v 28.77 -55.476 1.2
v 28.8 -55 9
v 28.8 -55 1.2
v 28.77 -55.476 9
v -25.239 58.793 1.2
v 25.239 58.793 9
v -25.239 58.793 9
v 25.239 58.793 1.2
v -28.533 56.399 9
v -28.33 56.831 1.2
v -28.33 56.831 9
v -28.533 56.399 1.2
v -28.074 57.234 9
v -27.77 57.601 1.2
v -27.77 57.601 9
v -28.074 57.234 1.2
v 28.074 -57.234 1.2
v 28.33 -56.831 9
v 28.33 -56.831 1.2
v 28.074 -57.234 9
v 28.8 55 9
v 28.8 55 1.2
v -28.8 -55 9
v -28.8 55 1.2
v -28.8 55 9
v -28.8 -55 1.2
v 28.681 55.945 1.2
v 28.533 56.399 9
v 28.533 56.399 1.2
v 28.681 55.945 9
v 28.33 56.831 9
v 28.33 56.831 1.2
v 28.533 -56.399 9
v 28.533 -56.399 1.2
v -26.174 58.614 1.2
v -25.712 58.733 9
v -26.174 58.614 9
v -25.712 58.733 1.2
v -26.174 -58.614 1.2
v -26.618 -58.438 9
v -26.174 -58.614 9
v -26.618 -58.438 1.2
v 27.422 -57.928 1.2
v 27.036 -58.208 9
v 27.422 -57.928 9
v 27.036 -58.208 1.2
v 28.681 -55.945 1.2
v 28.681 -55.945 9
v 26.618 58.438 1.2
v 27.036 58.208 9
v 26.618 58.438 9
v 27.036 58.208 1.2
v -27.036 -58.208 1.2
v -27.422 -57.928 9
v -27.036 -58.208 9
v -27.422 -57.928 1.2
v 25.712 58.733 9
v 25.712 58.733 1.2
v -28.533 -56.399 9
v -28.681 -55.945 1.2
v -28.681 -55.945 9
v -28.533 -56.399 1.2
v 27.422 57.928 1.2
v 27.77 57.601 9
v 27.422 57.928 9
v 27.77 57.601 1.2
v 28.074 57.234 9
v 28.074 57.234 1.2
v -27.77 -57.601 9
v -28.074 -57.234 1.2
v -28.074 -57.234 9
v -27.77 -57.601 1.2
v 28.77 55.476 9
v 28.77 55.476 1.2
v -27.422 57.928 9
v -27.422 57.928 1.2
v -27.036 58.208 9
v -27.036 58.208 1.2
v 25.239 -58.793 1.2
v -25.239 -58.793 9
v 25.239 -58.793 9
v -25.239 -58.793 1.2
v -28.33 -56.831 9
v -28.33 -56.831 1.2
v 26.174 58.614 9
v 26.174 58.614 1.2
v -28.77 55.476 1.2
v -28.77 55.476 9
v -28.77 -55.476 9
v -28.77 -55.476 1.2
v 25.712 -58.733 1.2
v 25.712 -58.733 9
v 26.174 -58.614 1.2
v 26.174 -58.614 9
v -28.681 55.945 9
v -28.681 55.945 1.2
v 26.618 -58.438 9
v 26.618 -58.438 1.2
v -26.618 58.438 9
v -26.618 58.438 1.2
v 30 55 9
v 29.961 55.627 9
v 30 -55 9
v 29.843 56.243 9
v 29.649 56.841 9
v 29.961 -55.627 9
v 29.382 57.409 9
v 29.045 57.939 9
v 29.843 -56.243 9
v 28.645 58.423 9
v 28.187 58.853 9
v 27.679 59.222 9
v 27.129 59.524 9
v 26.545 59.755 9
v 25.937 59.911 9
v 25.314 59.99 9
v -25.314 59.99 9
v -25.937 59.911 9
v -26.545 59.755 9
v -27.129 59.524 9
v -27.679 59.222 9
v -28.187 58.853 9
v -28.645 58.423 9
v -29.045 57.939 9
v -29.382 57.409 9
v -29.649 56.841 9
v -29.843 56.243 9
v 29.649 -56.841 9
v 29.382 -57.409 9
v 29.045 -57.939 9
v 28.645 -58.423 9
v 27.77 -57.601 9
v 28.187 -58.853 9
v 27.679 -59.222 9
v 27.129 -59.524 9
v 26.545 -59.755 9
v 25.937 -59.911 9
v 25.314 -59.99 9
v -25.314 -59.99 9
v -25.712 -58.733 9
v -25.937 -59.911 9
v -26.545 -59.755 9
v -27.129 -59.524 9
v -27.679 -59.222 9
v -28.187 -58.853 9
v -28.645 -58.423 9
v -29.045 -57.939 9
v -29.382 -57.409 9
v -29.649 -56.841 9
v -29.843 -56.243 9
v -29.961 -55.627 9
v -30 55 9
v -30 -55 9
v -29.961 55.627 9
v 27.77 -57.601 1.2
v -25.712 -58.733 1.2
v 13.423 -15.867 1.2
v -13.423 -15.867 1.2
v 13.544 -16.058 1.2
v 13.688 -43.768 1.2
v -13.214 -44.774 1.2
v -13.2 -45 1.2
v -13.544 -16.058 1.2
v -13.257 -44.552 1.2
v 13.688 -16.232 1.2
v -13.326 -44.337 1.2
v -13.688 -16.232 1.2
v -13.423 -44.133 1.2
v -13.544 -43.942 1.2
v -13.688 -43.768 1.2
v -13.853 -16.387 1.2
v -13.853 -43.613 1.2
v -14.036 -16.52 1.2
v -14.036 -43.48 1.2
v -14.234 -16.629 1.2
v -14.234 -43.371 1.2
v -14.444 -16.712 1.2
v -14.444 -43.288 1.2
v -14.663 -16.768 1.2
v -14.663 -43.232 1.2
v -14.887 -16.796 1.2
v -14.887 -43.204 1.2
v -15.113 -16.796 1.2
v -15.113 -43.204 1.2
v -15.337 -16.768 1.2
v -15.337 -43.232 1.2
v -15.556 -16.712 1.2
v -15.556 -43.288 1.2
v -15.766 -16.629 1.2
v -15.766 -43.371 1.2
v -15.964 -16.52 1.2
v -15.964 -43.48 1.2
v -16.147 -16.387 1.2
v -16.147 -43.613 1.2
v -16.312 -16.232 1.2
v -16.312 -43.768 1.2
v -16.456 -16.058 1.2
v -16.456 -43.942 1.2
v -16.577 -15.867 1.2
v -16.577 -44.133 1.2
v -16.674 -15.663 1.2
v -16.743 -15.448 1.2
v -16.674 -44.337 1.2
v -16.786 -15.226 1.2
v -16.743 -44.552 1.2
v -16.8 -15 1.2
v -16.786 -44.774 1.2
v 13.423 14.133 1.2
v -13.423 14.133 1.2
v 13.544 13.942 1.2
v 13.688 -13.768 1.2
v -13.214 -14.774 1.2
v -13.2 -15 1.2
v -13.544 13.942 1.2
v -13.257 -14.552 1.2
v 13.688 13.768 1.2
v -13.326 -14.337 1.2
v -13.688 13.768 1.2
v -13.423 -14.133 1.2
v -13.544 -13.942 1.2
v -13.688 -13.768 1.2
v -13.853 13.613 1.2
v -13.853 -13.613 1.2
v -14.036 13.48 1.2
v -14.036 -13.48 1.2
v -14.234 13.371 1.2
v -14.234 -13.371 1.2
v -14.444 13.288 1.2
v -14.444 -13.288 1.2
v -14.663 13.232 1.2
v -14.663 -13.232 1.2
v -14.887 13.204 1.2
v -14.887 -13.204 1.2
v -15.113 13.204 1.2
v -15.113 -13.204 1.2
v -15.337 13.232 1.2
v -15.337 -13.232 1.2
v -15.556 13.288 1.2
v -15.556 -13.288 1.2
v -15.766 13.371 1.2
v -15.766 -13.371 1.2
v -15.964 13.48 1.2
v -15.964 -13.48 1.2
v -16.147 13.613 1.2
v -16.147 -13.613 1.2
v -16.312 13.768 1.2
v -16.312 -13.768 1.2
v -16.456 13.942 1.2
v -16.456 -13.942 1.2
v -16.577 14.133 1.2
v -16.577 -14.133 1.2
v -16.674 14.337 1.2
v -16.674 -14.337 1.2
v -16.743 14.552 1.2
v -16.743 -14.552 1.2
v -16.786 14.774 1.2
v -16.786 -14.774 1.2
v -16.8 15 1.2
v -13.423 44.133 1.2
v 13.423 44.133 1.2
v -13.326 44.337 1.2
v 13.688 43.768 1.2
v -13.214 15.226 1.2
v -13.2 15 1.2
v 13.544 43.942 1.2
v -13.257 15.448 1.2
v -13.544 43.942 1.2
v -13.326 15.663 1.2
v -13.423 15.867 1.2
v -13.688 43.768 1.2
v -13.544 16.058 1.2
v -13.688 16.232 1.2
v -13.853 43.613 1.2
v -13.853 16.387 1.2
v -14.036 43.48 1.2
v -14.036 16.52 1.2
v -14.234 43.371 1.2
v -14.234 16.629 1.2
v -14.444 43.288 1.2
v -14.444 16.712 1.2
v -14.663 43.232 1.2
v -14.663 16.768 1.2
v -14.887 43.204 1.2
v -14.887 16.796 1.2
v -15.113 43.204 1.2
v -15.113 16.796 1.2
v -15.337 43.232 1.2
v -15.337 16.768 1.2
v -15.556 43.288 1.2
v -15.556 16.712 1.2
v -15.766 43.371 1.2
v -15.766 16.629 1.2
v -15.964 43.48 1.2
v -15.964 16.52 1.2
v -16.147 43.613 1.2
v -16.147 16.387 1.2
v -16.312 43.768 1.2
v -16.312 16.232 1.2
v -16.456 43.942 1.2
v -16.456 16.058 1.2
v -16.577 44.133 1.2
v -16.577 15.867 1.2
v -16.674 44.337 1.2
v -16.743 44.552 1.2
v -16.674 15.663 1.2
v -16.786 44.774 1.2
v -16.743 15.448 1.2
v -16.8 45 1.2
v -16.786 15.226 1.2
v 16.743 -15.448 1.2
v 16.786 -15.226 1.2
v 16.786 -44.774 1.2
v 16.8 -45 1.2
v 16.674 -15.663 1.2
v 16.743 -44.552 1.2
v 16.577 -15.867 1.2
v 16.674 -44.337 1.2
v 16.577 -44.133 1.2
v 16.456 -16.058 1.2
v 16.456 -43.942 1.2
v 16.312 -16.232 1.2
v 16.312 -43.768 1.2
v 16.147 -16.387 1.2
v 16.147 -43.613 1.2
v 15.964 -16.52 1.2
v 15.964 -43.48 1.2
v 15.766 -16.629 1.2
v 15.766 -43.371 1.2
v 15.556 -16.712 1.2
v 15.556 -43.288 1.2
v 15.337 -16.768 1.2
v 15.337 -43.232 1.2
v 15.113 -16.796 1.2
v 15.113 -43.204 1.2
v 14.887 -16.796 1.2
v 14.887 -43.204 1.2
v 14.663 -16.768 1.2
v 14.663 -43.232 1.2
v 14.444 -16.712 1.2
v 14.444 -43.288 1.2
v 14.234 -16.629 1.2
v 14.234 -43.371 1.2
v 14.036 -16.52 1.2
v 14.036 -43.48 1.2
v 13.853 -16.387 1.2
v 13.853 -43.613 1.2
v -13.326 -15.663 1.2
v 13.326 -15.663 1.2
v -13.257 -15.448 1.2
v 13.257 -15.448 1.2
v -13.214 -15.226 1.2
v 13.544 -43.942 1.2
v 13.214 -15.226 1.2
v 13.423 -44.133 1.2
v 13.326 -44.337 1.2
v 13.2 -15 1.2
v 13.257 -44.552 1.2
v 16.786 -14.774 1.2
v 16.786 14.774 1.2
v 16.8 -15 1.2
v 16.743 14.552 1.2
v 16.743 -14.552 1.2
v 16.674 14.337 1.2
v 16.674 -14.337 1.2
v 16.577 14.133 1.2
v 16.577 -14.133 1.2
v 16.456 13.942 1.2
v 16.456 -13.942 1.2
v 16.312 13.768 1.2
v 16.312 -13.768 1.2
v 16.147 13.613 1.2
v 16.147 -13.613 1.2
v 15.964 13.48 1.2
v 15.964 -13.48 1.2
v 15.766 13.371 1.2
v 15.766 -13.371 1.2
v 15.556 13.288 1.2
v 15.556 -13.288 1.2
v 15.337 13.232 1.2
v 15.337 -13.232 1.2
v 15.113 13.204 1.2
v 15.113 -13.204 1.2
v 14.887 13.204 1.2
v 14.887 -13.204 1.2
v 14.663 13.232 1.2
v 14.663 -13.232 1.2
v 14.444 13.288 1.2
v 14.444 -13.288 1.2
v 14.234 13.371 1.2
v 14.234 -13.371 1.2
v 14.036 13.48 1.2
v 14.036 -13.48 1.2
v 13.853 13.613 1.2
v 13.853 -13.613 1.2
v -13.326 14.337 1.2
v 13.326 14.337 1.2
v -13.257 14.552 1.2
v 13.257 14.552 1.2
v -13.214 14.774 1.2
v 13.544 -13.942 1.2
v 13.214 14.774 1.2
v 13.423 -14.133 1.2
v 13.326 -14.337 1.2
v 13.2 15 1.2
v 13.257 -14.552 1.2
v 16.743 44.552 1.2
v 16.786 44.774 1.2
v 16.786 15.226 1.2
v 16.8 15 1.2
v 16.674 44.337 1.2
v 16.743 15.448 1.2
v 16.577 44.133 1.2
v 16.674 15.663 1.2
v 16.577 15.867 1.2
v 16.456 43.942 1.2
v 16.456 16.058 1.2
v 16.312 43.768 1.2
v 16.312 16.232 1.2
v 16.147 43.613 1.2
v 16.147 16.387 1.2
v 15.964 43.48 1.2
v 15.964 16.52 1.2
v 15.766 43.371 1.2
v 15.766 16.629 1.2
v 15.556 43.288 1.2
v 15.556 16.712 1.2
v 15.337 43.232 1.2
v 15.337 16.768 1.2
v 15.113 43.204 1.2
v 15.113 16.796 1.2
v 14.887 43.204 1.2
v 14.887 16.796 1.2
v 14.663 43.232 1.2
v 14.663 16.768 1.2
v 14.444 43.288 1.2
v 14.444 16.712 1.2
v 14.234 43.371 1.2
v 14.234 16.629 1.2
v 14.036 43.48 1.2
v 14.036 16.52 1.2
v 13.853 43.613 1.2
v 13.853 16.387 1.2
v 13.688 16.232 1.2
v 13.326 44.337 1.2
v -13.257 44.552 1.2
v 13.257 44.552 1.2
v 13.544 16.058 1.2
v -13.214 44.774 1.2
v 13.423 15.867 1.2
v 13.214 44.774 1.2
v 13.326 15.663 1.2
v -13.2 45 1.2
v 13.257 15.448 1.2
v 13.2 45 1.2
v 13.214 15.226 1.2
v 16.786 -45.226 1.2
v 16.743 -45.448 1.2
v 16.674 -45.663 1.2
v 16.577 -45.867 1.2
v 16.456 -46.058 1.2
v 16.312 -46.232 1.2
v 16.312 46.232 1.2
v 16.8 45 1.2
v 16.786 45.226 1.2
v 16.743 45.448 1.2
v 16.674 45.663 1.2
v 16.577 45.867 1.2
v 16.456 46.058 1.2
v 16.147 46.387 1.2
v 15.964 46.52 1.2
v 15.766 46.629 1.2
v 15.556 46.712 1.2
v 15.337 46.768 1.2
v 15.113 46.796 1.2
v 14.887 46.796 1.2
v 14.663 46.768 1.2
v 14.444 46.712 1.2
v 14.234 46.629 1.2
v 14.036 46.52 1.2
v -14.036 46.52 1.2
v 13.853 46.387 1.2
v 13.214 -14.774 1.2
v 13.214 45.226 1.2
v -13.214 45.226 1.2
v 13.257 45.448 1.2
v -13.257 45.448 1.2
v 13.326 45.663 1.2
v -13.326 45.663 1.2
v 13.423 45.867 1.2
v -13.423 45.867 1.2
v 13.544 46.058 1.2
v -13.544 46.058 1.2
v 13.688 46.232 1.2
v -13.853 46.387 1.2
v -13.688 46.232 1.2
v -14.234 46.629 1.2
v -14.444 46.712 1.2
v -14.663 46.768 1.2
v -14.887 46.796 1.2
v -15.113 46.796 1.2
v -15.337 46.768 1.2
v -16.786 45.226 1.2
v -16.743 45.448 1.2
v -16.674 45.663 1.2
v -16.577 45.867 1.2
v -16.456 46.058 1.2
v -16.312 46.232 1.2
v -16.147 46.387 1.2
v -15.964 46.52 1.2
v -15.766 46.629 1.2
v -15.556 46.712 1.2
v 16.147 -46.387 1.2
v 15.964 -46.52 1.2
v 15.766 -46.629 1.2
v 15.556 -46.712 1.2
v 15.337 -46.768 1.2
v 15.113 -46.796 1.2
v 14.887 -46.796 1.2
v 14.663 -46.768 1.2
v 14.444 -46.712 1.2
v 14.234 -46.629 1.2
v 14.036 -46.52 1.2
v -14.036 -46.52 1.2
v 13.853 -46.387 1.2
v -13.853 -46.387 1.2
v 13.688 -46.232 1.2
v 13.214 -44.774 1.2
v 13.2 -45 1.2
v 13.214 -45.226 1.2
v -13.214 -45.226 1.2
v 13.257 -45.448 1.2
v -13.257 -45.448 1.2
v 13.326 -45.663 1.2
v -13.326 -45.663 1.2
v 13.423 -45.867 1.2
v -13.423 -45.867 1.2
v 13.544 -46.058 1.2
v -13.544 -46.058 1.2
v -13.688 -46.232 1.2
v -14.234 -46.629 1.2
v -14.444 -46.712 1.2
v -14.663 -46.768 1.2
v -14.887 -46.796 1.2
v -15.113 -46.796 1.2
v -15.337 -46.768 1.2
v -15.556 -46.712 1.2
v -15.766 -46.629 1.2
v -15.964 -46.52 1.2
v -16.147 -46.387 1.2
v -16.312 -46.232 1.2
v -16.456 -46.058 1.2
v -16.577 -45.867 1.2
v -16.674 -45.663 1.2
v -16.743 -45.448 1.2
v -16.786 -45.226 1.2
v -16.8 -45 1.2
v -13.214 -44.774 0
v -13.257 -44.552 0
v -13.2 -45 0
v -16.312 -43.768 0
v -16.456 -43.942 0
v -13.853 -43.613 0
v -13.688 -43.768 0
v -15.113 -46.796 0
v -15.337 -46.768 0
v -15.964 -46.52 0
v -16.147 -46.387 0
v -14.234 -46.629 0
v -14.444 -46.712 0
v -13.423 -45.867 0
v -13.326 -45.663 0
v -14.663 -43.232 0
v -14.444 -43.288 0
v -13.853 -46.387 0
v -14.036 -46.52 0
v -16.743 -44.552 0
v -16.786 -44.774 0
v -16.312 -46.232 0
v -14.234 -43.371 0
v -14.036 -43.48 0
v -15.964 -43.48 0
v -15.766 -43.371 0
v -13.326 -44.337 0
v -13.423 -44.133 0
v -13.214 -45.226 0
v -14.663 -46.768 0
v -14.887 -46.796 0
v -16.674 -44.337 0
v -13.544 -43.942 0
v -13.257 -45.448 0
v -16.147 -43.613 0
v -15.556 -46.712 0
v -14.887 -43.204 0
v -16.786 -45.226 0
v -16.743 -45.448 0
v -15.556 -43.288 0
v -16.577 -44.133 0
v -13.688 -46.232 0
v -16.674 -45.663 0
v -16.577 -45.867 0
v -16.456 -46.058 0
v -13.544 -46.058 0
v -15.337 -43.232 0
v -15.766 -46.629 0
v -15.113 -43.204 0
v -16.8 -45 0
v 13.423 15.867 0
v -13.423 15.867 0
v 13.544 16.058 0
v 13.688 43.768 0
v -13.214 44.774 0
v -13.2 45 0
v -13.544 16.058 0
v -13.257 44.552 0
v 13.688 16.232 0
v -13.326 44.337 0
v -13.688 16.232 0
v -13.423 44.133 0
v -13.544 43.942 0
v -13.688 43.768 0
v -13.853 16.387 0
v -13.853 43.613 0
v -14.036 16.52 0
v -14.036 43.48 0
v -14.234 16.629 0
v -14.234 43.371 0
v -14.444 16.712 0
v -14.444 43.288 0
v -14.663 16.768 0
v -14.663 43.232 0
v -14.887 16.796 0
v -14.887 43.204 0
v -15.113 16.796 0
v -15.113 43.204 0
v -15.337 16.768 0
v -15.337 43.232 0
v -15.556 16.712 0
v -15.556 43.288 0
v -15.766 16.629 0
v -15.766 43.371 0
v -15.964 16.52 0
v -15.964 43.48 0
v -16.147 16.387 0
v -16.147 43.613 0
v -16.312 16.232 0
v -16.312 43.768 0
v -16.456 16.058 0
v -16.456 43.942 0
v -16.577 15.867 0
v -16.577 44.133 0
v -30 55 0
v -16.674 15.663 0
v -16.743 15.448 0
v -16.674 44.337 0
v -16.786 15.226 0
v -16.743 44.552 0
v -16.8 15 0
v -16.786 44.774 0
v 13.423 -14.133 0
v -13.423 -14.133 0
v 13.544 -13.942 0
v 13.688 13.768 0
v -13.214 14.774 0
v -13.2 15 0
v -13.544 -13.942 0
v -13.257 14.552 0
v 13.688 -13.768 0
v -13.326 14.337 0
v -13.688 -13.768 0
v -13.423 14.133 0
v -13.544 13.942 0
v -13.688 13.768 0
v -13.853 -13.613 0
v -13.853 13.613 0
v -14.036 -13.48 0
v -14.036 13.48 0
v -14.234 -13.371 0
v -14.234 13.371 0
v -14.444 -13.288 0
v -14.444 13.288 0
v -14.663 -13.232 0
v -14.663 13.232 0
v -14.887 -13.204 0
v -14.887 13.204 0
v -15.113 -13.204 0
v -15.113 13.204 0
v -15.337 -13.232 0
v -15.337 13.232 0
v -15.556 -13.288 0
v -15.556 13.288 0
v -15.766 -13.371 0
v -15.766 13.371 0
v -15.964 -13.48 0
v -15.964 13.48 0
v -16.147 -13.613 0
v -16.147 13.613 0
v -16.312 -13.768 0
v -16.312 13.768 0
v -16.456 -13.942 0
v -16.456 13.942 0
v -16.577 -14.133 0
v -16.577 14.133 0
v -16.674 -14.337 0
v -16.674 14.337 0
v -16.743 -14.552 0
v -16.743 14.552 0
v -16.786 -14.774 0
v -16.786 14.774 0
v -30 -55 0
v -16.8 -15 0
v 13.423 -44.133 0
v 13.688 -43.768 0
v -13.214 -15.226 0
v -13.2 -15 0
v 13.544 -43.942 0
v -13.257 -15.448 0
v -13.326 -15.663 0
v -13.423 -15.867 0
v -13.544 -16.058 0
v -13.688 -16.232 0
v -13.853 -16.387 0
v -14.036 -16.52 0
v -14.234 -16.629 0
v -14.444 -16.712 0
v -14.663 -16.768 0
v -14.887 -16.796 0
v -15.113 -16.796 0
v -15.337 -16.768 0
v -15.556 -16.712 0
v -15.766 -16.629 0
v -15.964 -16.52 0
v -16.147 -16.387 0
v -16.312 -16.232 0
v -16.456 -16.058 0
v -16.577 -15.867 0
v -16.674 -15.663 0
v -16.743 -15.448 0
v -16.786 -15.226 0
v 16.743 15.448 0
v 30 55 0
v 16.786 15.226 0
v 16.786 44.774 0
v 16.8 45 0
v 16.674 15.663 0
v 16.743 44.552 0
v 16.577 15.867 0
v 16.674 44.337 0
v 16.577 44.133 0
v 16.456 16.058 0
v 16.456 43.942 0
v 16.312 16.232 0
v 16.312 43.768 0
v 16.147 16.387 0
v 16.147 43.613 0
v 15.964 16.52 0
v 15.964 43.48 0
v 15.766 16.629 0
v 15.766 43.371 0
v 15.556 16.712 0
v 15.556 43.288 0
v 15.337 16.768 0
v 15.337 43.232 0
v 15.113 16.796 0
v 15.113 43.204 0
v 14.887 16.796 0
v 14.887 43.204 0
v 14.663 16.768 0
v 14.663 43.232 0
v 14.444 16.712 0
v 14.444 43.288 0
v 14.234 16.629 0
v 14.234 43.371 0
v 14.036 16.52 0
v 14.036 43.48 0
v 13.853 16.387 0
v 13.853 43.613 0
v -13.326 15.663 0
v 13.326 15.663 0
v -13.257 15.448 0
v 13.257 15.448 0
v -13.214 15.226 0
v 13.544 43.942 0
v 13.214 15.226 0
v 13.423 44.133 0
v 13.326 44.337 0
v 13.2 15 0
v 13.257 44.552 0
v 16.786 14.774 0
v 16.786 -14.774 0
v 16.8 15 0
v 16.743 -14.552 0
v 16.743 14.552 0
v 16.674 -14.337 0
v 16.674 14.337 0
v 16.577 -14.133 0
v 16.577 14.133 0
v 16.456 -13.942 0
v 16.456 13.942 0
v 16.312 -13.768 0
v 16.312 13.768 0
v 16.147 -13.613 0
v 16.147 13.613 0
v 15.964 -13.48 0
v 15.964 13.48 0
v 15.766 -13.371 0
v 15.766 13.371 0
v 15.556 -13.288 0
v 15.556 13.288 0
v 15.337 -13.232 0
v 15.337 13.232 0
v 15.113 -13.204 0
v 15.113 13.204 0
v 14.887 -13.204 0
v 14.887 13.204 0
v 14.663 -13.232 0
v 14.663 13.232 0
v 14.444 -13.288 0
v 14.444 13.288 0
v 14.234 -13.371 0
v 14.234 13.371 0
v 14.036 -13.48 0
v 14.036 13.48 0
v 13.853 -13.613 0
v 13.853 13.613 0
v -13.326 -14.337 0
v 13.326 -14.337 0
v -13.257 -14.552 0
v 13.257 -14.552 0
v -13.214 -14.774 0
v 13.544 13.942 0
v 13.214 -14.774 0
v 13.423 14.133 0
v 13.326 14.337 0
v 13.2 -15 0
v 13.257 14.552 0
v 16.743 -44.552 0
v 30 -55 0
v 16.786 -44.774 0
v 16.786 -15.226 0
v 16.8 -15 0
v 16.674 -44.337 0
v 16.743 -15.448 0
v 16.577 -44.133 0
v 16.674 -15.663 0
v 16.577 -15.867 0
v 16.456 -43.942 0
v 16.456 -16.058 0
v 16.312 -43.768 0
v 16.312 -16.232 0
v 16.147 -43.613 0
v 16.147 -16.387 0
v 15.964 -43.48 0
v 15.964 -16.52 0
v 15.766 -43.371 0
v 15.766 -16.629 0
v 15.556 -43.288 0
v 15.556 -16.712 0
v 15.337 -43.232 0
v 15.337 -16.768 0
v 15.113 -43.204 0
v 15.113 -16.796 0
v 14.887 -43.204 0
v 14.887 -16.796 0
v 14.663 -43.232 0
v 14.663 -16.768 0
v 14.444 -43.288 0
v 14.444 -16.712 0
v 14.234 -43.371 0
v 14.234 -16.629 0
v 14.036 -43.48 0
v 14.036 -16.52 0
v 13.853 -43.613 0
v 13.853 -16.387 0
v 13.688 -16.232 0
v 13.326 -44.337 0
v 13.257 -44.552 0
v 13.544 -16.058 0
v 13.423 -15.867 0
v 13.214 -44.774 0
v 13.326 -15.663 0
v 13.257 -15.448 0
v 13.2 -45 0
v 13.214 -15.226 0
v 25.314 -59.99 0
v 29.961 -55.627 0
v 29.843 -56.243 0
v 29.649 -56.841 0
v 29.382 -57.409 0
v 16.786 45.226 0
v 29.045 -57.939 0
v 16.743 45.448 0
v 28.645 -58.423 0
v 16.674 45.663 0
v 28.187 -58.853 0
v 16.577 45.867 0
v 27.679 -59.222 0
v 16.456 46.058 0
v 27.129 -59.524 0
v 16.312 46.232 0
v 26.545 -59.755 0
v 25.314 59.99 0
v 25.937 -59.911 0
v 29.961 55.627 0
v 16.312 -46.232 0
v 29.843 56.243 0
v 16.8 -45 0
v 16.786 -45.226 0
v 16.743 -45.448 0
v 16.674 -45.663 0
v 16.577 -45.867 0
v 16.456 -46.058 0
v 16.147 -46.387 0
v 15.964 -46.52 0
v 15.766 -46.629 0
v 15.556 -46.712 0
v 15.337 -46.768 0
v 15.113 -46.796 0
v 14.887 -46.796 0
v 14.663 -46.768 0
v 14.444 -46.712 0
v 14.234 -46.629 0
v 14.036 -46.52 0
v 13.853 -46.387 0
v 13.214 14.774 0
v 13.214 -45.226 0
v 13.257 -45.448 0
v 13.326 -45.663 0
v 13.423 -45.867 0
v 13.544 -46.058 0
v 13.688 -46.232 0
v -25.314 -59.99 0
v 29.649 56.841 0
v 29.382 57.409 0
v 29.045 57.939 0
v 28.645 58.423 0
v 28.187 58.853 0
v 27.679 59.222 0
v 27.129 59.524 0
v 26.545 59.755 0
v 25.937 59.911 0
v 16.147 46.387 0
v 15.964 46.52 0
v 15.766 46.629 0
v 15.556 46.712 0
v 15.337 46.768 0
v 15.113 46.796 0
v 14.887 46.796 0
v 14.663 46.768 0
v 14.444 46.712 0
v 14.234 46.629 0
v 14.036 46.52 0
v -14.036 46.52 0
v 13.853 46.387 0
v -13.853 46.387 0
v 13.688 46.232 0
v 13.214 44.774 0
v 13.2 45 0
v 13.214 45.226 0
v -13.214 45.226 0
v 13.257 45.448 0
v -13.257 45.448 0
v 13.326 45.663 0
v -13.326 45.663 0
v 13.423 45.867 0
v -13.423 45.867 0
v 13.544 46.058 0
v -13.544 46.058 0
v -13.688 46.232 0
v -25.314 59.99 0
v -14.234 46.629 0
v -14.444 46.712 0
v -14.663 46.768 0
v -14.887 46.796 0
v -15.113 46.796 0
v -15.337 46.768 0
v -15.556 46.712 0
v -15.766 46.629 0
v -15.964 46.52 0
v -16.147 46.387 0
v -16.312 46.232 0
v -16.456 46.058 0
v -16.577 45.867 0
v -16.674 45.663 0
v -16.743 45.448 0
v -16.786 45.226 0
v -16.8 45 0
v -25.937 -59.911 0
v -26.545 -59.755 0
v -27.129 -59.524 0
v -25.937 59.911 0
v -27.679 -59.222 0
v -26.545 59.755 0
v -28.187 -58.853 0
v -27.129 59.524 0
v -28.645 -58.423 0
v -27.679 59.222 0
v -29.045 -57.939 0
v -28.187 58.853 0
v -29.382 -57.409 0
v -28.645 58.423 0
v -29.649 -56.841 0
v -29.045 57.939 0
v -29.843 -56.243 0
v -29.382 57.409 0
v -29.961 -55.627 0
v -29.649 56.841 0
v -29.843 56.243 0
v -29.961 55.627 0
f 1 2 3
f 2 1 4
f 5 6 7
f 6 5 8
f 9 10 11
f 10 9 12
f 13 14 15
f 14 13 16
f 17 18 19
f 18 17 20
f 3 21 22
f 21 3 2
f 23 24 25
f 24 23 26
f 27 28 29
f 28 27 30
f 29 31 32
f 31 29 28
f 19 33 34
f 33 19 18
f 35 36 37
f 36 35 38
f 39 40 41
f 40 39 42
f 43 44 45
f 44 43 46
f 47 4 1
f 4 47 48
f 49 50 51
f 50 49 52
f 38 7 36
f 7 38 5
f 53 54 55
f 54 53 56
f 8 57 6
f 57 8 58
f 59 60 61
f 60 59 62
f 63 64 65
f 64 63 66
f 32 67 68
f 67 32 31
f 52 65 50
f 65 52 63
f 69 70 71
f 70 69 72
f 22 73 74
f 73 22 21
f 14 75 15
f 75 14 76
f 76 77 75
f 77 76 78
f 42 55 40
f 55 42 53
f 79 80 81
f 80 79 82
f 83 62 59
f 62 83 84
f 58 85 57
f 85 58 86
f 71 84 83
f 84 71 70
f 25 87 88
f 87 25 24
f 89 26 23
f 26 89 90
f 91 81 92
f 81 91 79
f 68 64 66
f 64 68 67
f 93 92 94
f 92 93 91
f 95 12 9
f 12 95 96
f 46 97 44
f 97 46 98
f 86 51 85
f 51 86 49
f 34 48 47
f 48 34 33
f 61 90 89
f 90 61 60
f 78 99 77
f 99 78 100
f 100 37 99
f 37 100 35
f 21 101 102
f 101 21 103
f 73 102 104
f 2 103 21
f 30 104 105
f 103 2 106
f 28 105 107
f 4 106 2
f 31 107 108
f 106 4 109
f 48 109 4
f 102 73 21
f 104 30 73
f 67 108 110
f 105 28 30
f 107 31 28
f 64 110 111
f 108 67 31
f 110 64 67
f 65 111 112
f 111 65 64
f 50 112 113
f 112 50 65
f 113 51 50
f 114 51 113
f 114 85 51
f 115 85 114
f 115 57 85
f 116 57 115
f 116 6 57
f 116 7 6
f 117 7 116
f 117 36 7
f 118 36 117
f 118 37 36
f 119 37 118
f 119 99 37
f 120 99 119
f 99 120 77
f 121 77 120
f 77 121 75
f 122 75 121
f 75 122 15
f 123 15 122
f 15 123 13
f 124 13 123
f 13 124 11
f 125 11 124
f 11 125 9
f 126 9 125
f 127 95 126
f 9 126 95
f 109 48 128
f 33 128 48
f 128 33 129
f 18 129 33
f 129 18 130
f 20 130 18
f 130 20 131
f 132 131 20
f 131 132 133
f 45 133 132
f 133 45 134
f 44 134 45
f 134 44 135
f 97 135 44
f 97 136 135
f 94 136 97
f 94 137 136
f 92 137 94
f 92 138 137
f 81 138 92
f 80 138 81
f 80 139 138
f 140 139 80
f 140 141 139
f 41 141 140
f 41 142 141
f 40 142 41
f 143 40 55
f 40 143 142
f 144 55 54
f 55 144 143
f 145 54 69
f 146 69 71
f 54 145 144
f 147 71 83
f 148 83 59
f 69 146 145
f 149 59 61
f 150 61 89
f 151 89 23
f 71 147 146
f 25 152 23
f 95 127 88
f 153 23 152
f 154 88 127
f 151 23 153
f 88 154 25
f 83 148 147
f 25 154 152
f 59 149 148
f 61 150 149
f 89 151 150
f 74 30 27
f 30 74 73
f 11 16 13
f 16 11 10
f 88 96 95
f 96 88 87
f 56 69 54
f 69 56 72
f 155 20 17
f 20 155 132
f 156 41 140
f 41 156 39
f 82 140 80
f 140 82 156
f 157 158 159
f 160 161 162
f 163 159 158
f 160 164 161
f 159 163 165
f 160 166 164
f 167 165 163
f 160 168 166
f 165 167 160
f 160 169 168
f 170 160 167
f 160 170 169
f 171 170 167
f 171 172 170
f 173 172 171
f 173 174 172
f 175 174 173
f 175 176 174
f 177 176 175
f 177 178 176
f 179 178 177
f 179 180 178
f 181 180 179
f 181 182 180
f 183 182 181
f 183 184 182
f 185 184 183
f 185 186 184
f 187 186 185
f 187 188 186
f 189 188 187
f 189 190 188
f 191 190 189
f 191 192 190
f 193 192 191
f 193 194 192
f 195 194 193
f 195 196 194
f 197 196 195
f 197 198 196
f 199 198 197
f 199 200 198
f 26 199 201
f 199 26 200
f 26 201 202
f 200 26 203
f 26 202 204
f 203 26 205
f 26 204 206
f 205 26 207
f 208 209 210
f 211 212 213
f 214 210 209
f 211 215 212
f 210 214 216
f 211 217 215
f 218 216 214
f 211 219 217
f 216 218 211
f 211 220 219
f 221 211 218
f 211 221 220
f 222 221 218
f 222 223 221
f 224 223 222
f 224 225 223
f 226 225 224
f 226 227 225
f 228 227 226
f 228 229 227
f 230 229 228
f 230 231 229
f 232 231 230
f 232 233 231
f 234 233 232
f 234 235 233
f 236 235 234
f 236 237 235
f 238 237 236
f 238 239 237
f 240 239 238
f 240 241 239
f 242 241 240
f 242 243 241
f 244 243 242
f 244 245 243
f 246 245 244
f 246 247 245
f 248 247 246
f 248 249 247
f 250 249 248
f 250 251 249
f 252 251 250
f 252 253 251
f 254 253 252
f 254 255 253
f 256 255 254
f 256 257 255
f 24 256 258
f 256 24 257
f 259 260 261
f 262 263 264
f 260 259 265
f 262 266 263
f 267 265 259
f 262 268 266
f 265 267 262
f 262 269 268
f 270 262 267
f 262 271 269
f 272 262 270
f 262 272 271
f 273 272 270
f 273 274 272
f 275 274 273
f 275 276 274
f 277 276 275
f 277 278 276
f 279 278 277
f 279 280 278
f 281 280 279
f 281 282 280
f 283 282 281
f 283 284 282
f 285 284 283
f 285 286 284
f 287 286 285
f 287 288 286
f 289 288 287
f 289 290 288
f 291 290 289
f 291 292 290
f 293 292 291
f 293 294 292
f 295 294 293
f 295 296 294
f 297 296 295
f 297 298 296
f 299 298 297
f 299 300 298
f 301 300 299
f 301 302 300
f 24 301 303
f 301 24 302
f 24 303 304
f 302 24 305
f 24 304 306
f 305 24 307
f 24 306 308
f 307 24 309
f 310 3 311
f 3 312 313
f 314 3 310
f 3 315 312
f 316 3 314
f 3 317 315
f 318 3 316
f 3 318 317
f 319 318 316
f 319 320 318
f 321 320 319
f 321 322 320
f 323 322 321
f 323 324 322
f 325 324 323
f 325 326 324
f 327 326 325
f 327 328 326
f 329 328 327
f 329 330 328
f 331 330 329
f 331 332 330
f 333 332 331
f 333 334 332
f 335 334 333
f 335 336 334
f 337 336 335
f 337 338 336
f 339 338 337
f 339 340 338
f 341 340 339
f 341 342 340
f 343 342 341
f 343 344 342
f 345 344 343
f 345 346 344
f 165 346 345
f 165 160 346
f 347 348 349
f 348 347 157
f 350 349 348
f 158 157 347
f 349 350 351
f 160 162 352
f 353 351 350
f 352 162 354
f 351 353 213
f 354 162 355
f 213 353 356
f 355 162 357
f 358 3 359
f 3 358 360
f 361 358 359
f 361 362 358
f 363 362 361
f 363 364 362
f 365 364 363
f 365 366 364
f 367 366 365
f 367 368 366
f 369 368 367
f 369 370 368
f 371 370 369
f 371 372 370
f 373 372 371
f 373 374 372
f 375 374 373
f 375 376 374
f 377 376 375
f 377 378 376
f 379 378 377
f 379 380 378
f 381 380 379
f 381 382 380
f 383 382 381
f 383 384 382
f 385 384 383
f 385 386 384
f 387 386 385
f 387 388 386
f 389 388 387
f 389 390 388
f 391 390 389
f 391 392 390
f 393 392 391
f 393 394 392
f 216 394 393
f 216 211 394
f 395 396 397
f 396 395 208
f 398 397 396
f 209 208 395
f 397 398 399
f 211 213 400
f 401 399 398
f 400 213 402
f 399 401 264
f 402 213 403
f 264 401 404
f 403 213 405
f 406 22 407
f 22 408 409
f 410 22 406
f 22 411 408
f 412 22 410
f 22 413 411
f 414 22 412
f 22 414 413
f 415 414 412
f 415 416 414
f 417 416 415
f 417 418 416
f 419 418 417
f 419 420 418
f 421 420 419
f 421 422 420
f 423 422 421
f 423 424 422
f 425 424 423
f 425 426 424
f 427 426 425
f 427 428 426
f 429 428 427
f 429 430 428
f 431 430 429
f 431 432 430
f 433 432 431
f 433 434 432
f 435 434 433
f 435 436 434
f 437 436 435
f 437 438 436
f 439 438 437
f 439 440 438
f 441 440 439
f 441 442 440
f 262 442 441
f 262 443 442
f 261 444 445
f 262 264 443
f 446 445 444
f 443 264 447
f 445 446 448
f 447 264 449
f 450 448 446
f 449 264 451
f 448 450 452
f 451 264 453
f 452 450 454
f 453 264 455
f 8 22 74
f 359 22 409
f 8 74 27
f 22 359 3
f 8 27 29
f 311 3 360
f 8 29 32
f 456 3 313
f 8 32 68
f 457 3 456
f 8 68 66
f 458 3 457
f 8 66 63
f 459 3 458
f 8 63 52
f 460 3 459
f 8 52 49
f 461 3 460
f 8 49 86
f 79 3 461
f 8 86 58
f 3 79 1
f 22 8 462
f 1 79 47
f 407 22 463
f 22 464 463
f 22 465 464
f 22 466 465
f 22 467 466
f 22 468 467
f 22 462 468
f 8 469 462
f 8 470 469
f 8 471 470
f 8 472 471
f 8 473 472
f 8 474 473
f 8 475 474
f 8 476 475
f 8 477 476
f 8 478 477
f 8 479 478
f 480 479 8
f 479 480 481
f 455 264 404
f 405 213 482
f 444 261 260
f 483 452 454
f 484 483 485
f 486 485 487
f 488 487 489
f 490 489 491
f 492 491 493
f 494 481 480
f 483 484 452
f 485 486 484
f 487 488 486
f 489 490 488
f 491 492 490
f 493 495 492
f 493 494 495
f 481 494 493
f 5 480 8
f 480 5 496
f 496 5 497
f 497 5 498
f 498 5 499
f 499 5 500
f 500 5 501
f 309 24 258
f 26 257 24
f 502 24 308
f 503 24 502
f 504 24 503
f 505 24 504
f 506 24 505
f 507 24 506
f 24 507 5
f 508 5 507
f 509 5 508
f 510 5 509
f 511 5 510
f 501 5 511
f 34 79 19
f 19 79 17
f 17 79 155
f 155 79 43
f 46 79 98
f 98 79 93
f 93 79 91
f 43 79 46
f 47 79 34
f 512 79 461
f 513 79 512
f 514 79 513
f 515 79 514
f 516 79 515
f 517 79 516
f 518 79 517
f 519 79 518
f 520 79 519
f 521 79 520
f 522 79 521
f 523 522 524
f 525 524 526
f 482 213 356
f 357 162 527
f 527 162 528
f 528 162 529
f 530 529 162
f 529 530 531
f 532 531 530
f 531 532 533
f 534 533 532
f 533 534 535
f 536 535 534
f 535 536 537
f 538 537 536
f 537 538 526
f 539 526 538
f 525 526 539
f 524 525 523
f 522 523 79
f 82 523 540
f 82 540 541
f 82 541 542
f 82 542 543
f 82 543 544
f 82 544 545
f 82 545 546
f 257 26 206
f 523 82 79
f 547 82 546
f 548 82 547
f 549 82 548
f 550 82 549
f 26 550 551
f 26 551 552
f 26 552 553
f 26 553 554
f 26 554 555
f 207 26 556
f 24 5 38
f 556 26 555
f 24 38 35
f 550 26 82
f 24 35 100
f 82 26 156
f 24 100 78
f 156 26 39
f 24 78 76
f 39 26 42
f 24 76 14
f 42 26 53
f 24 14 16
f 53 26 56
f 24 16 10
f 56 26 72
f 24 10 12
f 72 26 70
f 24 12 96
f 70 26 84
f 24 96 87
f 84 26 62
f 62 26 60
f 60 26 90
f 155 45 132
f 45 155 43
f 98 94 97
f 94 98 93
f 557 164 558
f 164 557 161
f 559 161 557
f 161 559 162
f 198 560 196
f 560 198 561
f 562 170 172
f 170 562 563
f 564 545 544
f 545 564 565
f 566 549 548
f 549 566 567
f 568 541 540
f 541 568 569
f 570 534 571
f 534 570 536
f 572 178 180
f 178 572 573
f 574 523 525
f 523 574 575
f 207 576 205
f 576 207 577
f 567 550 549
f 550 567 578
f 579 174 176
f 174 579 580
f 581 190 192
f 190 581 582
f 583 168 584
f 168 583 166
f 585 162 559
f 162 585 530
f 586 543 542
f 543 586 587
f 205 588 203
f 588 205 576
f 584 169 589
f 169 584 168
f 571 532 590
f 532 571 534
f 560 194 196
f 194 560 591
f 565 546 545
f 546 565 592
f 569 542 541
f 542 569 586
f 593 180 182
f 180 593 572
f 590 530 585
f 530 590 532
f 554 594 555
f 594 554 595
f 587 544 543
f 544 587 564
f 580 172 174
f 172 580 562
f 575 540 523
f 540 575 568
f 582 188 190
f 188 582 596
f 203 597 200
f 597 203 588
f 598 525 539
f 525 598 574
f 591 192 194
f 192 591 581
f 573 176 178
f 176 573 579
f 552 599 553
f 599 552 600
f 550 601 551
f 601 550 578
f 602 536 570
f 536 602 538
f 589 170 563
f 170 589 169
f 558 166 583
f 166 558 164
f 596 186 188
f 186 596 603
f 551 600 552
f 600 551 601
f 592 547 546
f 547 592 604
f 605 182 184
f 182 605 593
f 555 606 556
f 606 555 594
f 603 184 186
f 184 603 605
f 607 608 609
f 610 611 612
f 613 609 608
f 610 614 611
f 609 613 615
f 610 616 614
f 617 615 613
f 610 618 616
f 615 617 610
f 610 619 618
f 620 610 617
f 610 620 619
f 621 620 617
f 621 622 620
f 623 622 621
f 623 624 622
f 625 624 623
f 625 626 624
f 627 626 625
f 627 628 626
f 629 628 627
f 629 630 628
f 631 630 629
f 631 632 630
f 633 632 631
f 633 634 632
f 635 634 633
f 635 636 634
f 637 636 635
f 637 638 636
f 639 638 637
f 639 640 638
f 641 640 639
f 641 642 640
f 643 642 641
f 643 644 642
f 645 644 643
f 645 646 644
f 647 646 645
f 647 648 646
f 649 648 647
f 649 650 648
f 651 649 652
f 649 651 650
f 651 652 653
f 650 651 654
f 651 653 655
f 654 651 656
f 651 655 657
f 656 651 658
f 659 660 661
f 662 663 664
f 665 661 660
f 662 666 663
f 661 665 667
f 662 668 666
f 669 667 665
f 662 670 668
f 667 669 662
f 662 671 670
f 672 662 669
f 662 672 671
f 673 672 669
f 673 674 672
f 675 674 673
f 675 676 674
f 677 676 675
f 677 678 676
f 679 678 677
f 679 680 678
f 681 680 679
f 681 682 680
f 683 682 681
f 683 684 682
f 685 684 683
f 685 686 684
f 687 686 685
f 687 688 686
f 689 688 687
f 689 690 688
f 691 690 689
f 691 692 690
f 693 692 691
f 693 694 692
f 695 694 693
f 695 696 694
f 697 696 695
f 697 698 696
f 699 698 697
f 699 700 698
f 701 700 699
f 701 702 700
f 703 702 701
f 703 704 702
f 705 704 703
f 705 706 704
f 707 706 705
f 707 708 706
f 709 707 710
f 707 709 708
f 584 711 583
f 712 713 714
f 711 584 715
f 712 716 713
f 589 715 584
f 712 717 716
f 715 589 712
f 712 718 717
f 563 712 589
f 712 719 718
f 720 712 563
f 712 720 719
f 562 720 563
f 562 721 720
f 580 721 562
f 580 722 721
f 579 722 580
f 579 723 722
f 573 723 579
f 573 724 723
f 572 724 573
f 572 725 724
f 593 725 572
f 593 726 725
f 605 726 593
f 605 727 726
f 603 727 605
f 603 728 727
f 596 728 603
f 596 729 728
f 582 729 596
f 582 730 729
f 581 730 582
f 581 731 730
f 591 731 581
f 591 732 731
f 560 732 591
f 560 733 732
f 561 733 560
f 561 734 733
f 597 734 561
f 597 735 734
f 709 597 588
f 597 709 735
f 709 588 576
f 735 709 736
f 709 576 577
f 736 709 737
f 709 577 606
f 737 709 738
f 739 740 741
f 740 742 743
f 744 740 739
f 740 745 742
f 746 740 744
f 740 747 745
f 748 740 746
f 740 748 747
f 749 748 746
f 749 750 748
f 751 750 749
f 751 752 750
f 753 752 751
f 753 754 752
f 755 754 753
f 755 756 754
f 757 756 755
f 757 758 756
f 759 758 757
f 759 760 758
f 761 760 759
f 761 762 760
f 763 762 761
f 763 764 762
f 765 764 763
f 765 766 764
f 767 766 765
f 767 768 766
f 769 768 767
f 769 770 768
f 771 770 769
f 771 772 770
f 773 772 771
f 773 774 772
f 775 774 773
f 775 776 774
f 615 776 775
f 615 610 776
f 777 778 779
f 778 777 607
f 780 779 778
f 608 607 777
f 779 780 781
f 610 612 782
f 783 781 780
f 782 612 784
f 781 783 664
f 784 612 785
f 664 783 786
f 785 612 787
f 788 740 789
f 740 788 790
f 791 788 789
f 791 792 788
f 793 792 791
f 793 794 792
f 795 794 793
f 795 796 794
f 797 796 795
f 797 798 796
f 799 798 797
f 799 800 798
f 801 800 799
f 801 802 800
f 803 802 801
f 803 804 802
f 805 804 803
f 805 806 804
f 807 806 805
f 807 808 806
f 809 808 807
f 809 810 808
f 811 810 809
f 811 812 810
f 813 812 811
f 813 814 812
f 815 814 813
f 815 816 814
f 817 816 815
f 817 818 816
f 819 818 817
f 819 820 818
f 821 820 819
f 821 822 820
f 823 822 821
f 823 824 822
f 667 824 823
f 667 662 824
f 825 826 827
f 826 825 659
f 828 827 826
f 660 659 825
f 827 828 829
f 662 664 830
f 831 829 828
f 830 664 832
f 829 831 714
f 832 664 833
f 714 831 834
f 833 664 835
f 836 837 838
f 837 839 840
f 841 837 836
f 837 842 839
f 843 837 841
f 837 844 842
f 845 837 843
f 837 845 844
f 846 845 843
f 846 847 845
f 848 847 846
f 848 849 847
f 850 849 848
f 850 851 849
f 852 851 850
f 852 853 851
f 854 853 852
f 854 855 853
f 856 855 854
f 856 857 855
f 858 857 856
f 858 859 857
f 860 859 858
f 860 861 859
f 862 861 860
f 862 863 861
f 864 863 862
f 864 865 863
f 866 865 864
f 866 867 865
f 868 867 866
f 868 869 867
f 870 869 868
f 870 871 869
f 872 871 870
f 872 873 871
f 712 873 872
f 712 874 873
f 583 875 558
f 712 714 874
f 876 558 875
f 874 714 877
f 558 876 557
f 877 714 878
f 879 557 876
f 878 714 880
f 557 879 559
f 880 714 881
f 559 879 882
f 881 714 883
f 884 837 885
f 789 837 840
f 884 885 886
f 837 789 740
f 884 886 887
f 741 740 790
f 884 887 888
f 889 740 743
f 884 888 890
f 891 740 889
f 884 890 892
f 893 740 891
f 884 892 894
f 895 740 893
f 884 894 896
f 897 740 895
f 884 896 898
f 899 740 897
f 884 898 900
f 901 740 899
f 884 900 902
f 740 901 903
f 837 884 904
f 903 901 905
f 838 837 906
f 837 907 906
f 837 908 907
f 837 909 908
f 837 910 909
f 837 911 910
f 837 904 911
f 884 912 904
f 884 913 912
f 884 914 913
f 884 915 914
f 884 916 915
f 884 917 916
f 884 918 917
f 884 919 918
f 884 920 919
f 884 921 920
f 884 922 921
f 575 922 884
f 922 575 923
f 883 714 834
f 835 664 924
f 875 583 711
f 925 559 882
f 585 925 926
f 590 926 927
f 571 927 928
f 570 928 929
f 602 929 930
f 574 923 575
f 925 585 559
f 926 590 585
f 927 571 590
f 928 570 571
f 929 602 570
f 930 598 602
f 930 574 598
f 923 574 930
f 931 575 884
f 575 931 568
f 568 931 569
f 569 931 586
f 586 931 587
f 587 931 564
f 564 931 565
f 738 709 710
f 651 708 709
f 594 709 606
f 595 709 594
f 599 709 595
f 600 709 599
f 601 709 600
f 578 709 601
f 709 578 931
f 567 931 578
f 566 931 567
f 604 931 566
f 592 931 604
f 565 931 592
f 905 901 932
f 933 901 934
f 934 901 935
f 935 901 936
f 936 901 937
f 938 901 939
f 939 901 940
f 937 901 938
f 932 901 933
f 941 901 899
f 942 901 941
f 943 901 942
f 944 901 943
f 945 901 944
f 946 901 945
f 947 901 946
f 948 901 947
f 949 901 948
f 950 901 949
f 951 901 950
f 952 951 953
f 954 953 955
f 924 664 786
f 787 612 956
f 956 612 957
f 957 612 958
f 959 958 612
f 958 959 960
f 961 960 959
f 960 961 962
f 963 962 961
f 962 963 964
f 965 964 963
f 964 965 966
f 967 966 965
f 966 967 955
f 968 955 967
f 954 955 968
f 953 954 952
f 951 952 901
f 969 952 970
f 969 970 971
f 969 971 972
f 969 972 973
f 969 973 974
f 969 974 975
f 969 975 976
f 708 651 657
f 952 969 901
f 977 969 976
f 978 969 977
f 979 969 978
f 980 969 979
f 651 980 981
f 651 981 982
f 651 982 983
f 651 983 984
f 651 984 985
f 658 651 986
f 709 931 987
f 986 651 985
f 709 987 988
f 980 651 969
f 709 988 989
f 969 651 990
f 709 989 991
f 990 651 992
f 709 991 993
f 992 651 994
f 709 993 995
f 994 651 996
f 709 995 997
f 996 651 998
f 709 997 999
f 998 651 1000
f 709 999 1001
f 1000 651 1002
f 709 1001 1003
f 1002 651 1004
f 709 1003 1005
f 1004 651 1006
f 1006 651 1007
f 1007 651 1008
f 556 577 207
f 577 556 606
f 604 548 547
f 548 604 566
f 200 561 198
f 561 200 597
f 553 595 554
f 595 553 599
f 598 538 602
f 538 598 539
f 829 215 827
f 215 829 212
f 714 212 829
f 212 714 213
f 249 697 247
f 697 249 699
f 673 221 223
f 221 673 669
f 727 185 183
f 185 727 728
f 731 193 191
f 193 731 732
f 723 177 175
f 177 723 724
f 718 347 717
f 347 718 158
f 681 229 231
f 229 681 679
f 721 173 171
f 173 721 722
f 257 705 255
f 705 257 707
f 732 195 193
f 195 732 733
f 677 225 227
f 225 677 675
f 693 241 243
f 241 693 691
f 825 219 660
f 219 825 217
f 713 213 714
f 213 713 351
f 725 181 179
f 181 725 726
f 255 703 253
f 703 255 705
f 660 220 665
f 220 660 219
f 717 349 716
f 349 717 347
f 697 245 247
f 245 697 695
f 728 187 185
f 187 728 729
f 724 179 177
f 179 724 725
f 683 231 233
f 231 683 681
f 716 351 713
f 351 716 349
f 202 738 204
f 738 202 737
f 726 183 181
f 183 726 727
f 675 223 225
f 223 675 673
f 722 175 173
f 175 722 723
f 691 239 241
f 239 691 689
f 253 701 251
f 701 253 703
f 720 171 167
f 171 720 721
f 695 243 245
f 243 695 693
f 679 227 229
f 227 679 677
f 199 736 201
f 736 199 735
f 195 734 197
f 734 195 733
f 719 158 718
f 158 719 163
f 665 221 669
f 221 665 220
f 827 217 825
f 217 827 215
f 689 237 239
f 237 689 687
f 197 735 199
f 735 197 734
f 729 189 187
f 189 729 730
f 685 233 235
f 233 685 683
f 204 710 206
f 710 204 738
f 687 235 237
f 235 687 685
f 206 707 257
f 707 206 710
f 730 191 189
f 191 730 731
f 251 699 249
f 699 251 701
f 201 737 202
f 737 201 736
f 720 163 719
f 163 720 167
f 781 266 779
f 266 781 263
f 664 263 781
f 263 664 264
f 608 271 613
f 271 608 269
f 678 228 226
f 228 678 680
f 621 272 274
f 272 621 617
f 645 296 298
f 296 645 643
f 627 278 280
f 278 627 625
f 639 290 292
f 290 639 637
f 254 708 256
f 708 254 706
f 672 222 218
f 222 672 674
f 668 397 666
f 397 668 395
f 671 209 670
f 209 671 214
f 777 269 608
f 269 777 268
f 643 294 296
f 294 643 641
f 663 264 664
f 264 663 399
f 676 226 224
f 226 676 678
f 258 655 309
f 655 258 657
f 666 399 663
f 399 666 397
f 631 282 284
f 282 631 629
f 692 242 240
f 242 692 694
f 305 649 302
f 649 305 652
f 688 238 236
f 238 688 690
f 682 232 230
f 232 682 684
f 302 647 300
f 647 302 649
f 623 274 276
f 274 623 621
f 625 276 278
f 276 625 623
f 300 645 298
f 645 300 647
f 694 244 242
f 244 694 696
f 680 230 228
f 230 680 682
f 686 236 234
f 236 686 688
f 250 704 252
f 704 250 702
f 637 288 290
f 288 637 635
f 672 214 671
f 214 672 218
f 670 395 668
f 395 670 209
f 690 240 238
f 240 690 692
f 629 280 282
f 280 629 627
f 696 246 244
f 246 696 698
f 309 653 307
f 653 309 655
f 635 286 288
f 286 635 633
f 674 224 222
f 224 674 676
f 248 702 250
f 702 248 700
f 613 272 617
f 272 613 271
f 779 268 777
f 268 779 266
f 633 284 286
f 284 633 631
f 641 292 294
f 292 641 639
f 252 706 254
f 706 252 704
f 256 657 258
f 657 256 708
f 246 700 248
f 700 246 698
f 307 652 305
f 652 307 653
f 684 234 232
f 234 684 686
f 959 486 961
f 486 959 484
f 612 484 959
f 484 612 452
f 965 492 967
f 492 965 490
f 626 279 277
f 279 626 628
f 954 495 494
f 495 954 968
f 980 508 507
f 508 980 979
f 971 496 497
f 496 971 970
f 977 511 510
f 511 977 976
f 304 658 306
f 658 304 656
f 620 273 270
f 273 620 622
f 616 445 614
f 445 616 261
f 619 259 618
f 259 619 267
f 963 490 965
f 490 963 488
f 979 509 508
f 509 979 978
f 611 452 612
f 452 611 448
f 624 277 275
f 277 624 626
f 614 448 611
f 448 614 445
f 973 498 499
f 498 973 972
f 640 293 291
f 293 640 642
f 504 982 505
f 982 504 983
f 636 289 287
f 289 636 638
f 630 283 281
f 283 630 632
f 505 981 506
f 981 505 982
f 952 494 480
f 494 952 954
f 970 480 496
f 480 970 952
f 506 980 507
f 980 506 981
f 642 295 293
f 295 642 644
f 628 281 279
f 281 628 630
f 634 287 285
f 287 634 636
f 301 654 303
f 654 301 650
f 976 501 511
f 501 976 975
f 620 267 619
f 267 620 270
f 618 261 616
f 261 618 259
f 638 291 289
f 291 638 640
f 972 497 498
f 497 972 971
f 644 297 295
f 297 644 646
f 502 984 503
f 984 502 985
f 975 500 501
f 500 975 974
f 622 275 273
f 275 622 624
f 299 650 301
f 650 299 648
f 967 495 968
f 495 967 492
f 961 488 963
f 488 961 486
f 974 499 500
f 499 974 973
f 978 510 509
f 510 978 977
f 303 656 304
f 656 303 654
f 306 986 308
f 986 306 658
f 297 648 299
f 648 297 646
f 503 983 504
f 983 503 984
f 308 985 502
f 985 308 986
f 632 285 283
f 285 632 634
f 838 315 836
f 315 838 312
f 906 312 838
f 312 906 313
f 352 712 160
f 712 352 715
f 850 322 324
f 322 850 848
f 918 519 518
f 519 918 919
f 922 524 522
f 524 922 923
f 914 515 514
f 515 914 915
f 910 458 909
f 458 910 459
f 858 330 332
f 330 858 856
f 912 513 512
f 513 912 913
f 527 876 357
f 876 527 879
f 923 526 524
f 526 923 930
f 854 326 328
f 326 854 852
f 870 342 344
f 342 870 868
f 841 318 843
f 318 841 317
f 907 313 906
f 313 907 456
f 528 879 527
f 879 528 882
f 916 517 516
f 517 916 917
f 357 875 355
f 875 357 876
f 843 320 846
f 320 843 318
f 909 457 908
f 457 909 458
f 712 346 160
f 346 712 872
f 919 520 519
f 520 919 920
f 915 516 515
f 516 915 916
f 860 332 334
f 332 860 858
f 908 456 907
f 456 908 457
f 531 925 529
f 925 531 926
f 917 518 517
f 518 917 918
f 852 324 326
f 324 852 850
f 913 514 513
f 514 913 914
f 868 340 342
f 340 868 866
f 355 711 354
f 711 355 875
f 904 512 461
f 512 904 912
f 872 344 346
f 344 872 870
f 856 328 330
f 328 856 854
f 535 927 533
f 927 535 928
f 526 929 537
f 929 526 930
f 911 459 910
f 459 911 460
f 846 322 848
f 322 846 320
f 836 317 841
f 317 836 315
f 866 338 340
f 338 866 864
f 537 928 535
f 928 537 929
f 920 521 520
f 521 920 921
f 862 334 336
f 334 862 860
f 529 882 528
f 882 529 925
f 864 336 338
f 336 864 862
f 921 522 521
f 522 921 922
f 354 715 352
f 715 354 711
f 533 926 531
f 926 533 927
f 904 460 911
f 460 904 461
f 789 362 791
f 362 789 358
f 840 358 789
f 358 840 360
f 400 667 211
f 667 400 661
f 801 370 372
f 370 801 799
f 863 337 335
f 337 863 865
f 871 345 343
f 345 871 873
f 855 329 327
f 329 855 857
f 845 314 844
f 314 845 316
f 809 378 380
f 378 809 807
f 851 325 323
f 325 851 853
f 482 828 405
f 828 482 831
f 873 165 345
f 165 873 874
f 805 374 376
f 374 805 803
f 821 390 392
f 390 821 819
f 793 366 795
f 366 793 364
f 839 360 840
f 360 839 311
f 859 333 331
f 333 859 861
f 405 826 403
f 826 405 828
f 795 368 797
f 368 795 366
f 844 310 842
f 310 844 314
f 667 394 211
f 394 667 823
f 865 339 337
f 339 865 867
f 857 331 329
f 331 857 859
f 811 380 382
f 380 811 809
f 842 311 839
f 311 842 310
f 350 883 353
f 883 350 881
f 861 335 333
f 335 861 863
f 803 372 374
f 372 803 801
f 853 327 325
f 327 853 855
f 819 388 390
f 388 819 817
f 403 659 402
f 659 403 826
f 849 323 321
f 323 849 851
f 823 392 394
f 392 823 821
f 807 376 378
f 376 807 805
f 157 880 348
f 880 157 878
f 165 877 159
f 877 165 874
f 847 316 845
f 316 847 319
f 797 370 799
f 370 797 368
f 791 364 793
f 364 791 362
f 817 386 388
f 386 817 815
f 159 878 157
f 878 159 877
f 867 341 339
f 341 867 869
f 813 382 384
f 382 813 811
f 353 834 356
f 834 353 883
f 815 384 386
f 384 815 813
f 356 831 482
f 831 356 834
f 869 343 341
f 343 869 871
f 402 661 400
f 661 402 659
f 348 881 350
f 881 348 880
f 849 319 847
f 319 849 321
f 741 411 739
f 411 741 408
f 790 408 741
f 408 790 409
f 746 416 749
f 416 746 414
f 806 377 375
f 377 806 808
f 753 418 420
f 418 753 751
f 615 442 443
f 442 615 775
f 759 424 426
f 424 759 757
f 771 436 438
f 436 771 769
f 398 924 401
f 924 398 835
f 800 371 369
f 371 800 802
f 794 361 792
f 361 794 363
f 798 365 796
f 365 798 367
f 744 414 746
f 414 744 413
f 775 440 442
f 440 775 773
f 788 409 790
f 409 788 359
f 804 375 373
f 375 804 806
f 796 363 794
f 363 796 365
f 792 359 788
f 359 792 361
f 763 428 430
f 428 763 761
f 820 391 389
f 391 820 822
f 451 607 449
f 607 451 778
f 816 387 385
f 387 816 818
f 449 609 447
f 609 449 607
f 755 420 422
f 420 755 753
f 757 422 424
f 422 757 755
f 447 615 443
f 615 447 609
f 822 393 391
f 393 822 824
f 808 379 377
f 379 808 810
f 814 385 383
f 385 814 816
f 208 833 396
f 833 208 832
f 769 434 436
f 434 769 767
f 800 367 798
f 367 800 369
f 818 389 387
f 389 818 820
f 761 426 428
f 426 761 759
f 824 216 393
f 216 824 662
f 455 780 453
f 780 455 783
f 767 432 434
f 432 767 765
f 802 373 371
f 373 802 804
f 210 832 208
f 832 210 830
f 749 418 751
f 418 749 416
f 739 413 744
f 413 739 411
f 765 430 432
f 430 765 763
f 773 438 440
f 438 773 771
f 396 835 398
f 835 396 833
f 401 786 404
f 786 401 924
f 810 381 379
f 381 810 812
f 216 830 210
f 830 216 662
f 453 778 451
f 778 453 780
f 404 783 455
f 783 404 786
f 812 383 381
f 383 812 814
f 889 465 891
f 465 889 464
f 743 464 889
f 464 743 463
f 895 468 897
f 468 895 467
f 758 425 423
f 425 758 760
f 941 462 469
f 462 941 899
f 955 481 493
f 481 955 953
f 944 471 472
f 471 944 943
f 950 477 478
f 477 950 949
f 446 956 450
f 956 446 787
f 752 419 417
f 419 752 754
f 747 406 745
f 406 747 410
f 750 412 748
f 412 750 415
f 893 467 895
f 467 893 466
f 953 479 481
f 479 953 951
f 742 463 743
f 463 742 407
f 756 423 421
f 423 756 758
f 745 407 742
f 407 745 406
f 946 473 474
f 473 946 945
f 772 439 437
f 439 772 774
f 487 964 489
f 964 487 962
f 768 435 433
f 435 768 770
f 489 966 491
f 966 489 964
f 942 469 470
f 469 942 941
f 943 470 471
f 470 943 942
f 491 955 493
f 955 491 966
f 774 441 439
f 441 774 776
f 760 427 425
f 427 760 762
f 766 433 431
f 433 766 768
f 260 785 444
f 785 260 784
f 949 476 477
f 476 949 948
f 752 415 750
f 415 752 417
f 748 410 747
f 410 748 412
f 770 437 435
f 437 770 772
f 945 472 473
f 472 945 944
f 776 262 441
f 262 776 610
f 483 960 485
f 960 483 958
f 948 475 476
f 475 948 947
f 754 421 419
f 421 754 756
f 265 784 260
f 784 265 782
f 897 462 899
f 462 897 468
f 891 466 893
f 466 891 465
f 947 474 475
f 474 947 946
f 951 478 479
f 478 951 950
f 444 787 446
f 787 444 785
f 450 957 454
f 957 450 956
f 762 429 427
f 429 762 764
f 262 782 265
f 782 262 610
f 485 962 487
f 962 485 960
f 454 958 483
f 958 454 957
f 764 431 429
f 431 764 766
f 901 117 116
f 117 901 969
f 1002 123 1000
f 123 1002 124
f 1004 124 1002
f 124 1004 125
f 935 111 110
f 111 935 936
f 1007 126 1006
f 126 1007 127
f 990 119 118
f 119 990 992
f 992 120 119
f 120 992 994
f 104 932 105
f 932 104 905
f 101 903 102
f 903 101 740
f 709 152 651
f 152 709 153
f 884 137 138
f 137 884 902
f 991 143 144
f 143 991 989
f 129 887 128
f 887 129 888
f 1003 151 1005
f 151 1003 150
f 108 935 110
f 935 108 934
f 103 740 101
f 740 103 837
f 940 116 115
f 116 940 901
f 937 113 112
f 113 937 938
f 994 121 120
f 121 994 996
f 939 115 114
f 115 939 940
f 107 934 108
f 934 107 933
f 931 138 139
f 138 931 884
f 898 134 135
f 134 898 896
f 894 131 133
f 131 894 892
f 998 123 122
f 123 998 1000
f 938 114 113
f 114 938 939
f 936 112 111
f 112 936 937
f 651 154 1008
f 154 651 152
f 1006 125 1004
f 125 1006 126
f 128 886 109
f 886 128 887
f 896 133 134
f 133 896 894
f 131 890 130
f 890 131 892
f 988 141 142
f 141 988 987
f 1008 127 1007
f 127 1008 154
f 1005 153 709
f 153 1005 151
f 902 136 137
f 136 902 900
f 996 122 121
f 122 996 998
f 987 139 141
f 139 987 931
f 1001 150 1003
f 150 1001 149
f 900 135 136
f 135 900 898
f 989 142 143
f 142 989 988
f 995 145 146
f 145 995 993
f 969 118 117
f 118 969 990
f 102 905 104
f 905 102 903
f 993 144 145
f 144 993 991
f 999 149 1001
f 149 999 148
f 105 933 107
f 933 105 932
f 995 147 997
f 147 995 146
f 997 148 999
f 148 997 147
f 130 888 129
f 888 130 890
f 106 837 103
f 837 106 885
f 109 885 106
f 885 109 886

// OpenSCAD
$fn = 50;


difference() {
	union() {
		hull() {
			translate(v = [-25.0000000000, 55.0000000000, 0]) {
				cylinder(h = 9, r = 5);
			}
			translate(v = [25.0000000000, 55.0000000000, 0]) {
				cylinder(h = 9, r = 5);
			}
			translate(v = [-25.0000000000, -55.0000000000, 0]) {
				cylinder(h = 9, r = 5);
			}
			translate(v = [25.0000000000, -55.0000000000, 0]) {
				cylinder(h = 9, r = 5);
			}
		}
	}
	union() {
		translate(v = [0, 0, 1.2000000000]) {
			hull() {
				translate(v = [-25.0000000000, 55.0000000000, 0]) {
					cylinder(h = 7.8000000000, r = 3.8000000000);
				}
				translate(v = [25.0000000000, 55.0000000000, 0]) {
					cylinder(h = 7.8000000000, r = 3.8000000000);
				}
				translate(v = [-25.0000000000, -55.0000000000, 0]) {
					cylinder(h = 7.8000000000, r = 3.8000000000);
				}
				translate(v = [25.0000000000, -55.0000000000, 0]) {
					cylinder(h = 7.8000000000, r = 3.8000000000);
				}
			}
		}
		#translate(v = [-15.0000000000, -45.0000000000, 0]) {
			cylinder(h = 1.2000000000, r = 1.8000000000);
		}
		#translate(v = [-15.0000000000, -15.0000000000, 0]) {
			cylinder(h = 1.2000000000, r = 1.8000000000);
		}
		#translate(v = [-15.0000000000, 15.0000000000, 0]) {
			cylinder(h = 1.2000000000, r = 1.8000000000);
		}
		#translate(v = [-15.0000000000, 45.0000000000, 0]) {
			cylinder(h = 1.2000000000, r = 1.8000000000);
		}
		#translate(v = [15.0000000000, -45.0000000000, 0]) {
			cylinder(h = 1.2000000000, r = 1.8000000000);
		}
		#translate(v = [15.0000000000, -15.0000000000, 0]) {
			cylinder(h = 1.2000000000, r = 1.8000000000);
		}
		#translate(v = [15.0000000000, 15.0000000000, 0]) {
			cylinder(h = 1.2000000000, r = 1.8000000000);
		}
		#translate(v = [15.0000000000, 45.0000000000, 0]) {
			cylinder(h = 1.2000000000, r = 1.8000000000);
		}
	}
}
